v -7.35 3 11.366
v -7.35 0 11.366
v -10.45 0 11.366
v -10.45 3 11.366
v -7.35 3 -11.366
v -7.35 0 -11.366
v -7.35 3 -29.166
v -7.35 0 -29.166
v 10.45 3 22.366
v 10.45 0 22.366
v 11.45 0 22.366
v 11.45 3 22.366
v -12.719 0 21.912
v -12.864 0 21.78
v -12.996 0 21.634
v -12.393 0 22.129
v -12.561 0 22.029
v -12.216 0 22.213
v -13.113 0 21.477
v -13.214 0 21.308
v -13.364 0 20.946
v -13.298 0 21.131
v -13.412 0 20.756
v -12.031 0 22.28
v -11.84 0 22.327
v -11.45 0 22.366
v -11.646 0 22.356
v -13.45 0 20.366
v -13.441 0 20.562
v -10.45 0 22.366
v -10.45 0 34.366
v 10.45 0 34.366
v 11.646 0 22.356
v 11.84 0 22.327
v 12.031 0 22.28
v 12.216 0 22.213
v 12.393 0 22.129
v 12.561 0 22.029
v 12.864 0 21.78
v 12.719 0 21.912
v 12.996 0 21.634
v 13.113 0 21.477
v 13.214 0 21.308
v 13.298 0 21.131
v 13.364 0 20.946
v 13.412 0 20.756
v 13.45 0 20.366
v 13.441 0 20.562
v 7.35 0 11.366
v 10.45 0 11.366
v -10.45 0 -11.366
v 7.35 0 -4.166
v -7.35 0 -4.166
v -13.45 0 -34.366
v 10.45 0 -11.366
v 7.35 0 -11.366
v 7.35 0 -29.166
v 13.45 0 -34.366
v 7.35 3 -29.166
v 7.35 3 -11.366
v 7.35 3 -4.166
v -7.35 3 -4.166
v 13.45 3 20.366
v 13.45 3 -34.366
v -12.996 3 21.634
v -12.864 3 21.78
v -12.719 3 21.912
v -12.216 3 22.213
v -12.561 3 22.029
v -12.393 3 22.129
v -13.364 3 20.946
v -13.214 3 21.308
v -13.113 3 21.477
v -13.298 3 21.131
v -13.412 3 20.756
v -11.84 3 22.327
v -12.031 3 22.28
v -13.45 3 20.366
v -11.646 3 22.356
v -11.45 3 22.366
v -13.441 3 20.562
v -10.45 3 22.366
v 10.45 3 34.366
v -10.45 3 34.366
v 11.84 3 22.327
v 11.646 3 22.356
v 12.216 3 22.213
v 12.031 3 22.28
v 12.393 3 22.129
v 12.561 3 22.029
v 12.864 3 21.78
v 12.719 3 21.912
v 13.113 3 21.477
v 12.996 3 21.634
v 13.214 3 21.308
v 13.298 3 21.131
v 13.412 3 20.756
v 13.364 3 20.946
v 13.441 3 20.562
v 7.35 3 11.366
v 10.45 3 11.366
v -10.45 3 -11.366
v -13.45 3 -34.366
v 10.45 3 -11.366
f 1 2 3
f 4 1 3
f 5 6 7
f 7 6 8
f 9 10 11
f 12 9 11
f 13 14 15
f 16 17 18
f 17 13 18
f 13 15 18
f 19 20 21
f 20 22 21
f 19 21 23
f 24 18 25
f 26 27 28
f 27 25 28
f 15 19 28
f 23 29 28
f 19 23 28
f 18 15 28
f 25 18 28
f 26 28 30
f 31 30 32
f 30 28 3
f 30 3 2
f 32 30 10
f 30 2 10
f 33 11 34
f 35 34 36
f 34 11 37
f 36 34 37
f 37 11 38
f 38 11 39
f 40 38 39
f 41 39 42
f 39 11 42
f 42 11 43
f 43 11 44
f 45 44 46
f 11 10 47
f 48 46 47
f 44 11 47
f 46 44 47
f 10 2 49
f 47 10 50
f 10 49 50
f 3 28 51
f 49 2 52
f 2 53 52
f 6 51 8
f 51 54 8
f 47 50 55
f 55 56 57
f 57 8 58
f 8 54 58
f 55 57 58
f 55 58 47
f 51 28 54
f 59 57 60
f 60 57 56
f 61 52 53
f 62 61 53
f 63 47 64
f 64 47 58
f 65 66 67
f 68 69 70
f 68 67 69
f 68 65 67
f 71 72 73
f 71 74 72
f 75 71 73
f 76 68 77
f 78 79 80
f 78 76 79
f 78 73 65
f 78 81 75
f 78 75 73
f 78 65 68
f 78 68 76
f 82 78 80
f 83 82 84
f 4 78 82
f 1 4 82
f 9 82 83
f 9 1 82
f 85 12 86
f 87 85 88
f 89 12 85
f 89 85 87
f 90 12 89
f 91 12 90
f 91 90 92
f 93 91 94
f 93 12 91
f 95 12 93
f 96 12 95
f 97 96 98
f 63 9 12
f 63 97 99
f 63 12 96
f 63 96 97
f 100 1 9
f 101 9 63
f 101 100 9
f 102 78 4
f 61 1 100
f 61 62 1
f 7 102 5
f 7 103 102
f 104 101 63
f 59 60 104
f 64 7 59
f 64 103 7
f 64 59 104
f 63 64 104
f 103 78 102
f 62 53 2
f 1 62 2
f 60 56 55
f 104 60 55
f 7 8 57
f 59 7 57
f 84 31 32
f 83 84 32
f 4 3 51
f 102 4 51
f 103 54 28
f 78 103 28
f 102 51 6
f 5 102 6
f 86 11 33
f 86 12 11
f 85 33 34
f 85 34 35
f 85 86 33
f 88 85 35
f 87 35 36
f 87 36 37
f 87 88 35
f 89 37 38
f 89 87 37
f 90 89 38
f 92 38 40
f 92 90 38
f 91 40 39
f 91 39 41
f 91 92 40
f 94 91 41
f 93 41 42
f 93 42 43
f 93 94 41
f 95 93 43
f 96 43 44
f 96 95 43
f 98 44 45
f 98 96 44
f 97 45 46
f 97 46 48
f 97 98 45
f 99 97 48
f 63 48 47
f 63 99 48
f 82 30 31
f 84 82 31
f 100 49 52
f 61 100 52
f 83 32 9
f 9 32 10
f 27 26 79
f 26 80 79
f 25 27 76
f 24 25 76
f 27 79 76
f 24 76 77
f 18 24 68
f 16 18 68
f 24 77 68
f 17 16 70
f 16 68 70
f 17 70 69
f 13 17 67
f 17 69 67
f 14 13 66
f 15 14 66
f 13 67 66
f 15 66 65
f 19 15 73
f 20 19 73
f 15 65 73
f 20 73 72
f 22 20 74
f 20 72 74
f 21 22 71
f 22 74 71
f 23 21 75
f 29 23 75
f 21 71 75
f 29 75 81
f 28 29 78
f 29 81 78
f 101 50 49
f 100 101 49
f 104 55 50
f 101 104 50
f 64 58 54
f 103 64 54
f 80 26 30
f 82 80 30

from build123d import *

# Parameters (mm, degrees)
BOSS_EXTRUDE1_DEPTH = 3
FILLET1_R           = 2


with BuildPart() as part:
    # Sketch1 → Boss-Extrude1 (new body)
    with BuildSketch(Plane(origin=(0, 0, 0), x_dir=(1, 0, 0), z_dir=(0, 1, 0))):
        Polygon((-10.45025, -22.36565), (-10.45025, -34.36565), (10.45025, -34.36565), (10.45025, -22.36565), (13.45025, -22.36565), (13.45025, 34.36565), (-13.45025, 34.36565), (-13.45025, -22.36565), align=None)
        Polygon((-7.35025, -11.36565), (-10.45025, -11.36565), (-10.45025, 11.36565), (-7.35025, 11.36565), (-7.35025, 29.16565), (7.35025, 29.16565), (7.35025, 11.36565), (10.45025, 11.36565), (10.45025, -11.36565), (7.35025, -11.36565), (7.35025, 4.16565), (-7.35025, 4.16565), align=None, mode=Mode.SUBTRACT)
    extrude(amount=BOSS_EXTRUDE1_DEPTH)

    # Fillet1
    fillet1_edges = [part.edges().sort_by_distance(p)[0] for p in [
        (-13.45025, 1.5, 22.36565),
        (13.45025, 1.5, 22.36565),
    ]]
    fillet(fillet1_edges, radius=FILLET1_R)


solid = part.part
